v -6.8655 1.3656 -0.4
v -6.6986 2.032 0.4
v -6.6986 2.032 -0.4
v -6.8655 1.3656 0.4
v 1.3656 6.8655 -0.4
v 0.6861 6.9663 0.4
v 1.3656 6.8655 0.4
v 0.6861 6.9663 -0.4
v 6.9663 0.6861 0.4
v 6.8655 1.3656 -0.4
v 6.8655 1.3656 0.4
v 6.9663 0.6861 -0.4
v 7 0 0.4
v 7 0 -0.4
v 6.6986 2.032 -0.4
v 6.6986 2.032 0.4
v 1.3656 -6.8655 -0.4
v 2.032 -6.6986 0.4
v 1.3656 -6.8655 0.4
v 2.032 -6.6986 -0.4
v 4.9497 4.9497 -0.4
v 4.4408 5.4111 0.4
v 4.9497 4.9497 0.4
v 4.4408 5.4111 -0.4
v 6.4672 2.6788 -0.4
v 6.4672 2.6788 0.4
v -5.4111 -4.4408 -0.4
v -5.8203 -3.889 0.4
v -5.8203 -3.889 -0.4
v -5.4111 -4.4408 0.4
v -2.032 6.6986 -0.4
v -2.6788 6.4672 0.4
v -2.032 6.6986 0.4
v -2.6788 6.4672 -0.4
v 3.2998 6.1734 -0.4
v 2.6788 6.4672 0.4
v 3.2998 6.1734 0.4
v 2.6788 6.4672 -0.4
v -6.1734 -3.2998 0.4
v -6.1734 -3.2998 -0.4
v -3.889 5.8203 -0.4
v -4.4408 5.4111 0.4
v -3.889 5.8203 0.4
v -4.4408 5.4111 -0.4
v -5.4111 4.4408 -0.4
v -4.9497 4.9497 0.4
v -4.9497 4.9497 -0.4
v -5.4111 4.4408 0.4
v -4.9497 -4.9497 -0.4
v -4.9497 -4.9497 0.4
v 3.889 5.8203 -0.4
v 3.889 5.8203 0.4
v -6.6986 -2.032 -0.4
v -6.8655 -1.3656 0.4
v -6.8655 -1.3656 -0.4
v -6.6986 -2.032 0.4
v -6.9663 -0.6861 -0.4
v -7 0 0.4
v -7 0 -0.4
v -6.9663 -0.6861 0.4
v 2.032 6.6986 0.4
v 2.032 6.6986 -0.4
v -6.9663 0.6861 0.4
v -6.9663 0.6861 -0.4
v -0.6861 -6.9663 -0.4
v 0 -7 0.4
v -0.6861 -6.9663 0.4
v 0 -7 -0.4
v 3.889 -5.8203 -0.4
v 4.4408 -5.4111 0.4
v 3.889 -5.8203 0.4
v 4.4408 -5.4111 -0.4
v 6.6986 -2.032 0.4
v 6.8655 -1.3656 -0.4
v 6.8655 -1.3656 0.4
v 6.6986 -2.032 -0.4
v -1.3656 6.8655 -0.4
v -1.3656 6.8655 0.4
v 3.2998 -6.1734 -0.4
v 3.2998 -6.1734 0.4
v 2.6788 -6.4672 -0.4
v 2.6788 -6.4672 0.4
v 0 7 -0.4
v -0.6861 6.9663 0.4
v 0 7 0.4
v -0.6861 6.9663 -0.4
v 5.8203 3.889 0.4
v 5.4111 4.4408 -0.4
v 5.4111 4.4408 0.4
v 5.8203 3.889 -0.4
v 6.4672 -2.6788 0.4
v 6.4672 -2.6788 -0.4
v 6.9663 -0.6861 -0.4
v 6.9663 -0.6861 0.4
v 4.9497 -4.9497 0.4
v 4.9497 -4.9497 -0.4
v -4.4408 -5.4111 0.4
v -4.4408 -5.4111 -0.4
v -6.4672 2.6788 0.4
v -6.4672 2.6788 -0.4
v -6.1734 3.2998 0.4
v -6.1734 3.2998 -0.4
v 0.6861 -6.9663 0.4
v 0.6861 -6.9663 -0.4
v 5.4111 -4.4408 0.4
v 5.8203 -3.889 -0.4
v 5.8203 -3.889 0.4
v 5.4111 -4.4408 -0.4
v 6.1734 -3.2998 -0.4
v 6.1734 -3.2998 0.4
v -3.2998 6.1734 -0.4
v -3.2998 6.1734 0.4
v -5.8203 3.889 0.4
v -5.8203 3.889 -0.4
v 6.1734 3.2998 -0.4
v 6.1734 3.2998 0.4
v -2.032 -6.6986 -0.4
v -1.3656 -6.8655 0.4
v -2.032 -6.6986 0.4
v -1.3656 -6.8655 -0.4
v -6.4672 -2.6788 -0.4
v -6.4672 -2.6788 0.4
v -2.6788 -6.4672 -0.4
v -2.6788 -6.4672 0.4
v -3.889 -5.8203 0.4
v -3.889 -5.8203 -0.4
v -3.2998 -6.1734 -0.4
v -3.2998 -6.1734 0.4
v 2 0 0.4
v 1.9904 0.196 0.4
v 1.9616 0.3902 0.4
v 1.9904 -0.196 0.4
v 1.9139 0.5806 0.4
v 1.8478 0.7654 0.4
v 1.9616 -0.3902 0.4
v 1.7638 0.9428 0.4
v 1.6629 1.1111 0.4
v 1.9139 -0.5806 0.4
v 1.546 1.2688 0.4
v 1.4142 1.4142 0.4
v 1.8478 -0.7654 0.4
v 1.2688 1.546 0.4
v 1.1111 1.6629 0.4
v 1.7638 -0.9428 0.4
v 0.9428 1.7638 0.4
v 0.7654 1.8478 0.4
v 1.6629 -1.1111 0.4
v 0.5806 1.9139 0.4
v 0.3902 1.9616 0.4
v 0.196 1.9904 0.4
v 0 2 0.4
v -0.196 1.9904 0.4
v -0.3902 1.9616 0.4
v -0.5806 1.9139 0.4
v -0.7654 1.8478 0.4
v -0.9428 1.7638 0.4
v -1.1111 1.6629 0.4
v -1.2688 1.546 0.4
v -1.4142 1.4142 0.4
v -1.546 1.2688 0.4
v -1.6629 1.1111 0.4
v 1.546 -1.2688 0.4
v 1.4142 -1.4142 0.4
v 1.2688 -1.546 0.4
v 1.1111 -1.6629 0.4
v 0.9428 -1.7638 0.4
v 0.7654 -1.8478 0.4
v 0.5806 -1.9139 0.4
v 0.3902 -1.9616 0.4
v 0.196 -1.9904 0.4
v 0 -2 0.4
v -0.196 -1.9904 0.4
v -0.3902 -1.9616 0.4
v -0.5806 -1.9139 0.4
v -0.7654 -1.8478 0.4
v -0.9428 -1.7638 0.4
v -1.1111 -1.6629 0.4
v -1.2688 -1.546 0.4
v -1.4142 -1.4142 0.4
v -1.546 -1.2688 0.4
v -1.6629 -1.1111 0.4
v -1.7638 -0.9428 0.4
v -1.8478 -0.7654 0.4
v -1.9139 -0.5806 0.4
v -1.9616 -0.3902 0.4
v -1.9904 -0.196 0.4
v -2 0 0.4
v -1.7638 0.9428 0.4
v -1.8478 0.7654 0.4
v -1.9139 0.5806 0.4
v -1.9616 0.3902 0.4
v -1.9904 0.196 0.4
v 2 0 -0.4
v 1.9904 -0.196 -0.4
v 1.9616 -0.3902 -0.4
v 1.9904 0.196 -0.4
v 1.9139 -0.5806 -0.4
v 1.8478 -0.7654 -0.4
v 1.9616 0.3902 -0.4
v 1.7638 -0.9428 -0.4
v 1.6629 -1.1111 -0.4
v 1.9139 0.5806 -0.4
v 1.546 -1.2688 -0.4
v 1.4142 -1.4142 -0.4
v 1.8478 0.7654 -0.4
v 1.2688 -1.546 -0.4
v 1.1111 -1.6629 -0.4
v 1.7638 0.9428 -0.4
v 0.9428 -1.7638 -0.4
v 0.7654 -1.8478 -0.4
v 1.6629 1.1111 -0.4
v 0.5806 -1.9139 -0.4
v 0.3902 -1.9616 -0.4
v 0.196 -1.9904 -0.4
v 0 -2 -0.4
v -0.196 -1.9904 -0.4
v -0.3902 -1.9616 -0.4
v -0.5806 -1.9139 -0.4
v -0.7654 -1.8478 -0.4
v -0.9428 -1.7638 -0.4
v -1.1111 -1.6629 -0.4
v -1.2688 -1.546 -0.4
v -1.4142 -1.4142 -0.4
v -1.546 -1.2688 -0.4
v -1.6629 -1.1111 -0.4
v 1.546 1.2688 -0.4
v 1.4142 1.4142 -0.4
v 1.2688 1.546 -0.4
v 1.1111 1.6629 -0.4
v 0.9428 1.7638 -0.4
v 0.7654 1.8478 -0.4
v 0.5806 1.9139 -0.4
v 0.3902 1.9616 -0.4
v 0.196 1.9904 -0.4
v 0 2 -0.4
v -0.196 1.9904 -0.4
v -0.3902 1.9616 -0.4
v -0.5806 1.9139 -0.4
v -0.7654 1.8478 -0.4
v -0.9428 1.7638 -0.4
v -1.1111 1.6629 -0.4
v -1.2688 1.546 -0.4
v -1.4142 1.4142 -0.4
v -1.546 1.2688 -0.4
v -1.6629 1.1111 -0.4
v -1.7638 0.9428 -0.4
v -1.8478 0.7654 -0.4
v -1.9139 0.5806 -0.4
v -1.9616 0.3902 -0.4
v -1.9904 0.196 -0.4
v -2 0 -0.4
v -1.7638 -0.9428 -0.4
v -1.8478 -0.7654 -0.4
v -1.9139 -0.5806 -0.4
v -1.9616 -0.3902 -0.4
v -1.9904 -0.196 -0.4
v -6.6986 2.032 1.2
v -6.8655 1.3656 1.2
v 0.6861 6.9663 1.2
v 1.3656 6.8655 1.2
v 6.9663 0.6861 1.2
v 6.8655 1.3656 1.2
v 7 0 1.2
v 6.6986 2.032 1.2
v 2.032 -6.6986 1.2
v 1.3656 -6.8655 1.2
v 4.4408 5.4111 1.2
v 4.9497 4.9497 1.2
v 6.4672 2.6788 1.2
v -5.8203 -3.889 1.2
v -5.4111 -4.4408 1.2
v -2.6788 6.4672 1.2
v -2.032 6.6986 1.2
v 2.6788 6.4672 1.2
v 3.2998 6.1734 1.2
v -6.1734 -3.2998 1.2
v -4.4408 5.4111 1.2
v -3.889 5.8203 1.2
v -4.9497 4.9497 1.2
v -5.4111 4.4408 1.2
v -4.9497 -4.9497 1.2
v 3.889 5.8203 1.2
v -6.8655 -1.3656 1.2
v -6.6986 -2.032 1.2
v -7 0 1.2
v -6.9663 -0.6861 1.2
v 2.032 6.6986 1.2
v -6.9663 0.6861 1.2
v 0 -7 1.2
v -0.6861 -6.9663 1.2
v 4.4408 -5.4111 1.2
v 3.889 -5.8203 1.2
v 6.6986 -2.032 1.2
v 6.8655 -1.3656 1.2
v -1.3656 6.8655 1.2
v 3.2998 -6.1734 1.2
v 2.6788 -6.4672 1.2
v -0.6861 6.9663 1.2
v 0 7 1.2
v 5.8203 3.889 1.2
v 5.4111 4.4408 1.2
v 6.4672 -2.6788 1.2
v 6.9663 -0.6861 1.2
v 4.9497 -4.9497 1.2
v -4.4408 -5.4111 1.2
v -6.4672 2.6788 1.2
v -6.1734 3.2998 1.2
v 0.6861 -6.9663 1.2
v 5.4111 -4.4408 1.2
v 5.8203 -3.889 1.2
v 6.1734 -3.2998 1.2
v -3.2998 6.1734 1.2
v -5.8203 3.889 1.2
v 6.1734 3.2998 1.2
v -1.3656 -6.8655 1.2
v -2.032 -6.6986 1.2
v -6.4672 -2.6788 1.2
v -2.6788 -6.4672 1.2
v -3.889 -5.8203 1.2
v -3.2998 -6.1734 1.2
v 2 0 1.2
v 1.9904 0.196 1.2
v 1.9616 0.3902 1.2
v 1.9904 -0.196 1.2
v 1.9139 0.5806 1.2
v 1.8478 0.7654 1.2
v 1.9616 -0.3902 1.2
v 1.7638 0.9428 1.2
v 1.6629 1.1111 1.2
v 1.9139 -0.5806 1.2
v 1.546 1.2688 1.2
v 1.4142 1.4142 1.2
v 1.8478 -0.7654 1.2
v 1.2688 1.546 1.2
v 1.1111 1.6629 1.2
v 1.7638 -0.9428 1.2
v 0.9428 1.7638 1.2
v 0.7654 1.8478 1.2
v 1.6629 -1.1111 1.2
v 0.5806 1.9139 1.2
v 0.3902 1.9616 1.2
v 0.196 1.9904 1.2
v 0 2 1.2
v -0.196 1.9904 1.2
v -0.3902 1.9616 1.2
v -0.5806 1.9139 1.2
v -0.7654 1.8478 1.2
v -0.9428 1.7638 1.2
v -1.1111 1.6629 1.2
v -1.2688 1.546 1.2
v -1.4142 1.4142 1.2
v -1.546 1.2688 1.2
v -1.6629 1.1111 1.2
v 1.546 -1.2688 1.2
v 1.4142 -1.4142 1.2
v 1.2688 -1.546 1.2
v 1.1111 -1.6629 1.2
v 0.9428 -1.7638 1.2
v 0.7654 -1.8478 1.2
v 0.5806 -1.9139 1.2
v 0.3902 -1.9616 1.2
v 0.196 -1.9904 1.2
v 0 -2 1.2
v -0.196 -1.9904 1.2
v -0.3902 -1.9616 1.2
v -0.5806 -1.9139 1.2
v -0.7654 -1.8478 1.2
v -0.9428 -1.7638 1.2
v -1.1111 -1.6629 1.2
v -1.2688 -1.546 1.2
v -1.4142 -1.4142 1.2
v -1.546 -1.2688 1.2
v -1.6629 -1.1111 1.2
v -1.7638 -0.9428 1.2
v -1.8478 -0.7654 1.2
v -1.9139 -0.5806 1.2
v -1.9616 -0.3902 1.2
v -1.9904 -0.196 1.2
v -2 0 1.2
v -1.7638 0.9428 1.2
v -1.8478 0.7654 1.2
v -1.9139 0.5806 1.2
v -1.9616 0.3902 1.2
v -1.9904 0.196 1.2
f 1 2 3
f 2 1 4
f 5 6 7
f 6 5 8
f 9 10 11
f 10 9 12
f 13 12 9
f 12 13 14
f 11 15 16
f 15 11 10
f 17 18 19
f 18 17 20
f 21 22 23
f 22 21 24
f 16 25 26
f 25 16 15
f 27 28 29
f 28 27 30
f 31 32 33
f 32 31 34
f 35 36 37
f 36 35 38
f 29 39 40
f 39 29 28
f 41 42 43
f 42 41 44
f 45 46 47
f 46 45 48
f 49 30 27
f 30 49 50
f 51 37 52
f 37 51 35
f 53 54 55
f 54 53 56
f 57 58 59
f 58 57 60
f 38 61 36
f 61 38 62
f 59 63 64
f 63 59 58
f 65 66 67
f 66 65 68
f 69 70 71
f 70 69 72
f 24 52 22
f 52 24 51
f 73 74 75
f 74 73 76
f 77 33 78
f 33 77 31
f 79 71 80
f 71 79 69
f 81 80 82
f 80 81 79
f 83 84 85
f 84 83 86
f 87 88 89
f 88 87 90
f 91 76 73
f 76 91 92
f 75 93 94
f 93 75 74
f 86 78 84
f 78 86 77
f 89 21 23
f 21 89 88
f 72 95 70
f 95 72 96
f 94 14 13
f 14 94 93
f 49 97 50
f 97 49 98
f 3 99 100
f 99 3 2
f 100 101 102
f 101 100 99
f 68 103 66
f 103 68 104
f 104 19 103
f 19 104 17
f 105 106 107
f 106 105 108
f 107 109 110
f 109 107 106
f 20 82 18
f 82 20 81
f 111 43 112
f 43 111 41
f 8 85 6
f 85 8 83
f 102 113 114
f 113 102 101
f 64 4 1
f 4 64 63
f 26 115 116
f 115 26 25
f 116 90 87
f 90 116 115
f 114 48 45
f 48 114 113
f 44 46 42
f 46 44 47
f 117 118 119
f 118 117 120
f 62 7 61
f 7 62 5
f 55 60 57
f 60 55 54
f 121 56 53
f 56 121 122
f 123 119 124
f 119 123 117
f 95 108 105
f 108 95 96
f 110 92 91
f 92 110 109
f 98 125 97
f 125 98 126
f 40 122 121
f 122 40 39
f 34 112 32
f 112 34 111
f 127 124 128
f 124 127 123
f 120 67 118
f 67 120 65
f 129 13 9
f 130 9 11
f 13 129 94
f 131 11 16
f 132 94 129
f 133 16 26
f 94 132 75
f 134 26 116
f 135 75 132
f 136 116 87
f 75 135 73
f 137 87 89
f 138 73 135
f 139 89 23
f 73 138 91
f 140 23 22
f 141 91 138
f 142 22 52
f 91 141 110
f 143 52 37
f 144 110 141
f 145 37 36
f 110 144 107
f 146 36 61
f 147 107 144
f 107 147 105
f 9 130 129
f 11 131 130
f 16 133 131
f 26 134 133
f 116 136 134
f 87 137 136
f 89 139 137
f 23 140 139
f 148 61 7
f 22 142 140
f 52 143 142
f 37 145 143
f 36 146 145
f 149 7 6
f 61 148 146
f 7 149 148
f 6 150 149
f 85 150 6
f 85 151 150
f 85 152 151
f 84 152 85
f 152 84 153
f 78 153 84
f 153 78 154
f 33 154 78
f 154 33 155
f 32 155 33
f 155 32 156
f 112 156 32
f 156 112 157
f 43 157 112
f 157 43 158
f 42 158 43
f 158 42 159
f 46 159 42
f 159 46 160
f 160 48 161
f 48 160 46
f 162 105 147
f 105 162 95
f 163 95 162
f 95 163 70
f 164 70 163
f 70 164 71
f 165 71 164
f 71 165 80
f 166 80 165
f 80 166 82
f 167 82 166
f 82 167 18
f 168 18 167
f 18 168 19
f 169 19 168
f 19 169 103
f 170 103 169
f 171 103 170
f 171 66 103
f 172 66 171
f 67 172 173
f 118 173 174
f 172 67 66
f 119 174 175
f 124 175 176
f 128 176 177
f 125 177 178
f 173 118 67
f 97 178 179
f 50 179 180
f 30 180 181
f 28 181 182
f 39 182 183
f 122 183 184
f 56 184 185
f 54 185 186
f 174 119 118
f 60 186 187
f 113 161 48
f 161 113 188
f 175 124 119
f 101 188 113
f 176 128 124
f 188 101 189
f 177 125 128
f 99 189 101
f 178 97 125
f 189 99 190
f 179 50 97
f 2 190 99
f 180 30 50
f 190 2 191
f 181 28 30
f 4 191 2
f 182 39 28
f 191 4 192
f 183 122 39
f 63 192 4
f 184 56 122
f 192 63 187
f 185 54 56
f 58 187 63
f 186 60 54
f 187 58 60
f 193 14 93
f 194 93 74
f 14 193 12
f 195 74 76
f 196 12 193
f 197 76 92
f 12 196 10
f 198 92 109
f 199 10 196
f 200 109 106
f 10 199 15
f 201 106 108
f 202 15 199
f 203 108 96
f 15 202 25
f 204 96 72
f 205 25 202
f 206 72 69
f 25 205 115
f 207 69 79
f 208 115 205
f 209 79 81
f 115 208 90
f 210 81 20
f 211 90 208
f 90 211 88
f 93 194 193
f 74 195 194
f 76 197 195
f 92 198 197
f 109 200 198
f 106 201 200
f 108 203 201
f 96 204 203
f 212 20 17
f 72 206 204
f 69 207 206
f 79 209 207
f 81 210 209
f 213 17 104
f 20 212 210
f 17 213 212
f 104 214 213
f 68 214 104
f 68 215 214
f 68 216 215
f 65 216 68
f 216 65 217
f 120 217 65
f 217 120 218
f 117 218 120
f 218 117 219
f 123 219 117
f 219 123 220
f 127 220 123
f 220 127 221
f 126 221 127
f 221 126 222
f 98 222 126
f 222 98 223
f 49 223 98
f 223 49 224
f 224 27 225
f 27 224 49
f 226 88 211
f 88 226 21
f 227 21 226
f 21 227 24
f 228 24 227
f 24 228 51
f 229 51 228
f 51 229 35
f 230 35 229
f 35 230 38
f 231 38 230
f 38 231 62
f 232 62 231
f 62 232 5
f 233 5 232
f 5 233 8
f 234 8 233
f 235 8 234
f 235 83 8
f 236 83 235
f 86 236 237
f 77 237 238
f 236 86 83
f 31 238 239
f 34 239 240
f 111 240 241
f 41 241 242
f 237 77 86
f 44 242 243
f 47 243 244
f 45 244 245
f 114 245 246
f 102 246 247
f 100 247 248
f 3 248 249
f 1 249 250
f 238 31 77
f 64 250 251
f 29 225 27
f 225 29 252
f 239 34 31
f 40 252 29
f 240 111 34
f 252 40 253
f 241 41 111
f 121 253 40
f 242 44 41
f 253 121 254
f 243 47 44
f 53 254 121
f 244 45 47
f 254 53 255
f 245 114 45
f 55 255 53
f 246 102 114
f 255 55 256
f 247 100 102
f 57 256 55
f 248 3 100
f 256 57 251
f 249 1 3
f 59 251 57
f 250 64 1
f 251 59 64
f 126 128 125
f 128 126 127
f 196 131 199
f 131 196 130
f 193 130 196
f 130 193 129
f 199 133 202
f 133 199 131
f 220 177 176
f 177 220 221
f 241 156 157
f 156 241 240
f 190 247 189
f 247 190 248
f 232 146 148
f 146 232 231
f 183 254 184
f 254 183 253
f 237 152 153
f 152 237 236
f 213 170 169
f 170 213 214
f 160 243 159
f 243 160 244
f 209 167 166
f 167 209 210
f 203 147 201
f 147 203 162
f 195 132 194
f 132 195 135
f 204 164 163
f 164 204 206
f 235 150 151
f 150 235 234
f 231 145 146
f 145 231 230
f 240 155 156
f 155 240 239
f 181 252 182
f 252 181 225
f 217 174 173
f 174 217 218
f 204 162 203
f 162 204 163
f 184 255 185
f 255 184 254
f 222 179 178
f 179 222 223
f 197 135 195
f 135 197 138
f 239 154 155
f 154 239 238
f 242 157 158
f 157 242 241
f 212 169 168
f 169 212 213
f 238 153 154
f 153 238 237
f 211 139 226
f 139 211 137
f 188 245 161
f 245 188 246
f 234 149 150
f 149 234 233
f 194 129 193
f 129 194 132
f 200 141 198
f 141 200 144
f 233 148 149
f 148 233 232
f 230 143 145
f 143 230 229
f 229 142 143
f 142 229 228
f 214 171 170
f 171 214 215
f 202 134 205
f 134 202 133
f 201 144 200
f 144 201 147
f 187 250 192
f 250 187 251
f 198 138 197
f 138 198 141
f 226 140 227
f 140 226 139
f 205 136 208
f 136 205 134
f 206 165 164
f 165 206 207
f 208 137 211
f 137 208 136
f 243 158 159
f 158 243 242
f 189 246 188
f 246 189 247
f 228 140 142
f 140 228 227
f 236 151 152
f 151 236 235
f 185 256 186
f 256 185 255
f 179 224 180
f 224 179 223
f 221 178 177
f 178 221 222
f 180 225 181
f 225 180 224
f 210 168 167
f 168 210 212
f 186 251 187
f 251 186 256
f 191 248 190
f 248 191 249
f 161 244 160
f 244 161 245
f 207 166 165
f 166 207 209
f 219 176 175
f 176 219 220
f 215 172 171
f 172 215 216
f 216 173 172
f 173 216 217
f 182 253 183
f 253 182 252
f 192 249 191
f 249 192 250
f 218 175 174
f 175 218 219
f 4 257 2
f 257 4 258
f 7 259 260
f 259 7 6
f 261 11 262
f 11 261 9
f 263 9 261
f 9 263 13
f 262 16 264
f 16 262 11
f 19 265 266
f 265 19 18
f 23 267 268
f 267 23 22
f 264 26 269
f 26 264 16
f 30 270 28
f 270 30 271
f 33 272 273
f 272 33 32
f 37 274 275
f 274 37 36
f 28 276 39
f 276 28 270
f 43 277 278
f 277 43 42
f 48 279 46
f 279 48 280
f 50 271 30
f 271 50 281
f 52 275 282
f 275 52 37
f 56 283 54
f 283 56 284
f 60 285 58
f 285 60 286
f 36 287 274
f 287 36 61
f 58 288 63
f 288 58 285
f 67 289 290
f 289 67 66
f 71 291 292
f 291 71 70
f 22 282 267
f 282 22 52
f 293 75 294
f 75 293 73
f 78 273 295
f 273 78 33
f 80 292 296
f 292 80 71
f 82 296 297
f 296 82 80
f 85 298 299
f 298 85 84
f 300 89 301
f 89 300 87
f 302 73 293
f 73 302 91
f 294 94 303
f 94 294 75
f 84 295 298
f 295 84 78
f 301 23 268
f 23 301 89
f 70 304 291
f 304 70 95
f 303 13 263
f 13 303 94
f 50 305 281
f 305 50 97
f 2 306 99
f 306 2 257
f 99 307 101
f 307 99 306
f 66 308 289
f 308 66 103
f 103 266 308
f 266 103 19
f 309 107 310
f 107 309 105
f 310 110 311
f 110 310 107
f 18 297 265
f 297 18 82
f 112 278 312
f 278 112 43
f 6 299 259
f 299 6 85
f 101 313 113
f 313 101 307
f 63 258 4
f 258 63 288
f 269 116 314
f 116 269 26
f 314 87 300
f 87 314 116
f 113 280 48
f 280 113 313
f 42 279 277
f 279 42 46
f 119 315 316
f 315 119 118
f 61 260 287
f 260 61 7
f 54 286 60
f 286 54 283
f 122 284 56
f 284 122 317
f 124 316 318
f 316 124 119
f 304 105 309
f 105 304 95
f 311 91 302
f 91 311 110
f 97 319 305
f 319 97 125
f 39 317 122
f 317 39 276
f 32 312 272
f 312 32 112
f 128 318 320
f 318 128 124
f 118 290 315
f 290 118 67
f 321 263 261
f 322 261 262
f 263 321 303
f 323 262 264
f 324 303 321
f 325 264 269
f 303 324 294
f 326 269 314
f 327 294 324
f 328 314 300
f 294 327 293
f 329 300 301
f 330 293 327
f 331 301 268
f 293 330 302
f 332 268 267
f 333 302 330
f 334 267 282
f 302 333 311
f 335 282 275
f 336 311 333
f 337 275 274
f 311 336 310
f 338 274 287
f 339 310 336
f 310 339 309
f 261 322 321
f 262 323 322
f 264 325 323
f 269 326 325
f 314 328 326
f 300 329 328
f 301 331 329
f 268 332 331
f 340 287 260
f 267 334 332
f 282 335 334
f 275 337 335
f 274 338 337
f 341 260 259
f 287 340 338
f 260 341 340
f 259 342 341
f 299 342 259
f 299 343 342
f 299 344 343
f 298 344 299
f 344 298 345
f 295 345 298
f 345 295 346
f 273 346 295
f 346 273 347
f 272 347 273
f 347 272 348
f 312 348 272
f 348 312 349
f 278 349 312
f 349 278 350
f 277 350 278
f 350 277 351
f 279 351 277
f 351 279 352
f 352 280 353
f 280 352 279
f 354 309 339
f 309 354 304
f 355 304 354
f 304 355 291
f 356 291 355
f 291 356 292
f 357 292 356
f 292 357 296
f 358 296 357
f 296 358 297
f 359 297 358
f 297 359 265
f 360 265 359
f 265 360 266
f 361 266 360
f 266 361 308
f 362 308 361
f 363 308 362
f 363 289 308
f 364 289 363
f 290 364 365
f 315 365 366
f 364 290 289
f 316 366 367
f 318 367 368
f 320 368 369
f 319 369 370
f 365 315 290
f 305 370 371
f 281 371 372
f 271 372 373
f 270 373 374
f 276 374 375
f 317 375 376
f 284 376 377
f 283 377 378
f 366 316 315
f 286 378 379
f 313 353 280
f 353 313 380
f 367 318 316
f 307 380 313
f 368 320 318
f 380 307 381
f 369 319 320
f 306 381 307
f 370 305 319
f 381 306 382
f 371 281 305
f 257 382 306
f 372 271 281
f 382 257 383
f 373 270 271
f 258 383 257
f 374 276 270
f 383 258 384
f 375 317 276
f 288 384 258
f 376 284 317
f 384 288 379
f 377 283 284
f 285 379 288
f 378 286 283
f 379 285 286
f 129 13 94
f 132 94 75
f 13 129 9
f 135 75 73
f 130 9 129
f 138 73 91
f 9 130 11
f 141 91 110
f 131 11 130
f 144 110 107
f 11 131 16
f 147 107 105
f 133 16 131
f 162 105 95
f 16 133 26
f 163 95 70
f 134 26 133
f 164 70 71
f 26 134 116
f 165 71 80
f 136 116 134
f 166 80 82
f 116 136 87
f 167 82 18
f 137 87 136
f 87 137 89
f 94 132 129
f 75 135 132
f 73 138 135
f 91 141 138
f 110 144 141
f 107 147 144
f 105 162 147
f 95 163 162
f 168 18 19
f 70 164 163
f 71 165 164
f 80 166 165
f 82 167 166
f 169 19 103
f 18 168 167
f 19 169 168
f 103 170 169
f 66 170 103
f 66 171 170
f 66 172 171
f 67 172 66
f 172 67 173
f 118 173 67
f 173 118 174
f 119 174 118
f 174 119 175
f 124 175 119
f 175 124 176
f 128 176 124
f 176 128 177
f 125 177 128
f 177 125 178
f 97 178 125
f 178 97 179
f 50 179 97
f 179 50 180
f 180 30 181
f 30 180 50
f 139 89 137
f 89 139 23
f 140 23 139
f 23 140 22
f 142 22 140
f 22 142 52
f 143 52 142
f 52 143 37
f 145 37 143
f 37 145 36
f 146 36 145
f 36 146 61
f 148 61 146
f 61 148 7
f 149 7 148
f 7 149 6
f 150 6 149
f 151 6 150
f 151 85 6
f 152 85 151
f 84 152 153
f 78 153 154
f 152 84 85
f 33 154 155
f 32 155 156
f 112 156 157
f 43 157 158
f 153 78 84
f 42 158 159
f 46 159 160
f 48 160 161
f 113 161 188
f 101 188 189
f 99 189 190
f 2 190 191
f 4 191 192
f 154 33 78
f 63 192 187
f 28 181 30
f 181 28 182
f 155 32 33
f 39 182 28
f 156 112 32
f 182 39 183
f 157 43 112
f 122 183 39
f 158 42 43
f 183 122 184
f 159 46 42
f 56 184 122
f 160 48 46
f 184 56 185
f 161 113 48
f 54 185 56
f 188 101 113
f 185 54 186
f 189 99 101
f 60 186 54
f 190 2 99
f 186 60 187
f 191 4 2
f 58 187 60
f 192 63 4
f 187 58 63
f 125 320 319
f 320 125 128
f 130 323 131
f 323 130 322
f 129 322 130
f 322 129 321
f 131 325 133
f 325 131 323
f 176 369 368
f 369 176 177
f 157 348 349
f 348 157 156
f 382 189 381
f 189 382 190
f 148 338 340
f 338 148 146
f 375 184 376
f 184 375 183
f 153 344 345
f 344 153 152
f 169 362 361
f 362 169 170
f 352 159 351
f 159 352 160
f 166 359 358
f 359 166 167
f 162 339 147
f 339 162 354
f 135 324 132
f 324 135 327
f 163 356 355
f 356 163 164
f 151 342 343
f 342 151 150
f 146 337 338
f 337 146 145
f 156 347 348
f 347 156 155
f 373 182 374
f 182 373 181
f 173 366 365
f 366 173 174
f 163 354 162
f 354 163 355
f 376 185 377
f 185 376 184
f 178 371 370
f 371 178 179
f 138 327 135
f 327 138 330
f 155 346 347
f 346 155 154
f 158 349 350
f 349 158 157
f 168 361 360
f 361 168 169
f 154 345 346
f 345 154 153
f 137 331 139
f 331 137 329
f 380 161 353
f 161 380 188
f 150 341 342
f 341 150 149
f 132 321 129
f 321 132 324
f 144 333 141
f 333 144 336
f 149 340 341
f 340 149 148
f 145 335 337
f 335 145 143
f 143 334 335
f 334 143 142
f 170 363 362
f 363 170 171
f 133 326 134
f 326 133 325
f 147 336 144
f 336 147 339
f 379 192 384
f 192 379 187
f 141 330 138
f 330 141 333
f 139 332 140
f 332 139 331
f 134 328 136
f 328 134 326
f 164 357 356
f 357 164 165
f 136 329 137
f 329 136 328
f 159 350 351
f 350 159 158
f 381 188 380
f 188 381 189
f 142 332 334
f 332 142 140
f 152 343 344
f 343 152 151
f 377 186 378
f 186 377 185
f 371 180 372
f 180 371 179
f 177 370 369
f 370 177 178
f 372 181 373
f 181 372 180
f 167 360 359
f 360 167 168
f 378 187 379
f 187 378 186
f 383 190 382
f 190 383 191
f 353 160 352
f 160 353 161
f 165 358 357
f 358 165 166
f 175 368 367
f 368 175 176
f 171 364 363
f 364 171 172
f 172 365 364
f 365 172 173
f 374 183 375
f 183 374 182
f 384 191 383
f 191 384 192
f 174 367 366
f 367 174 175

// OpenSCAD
// Parameters
inner_diameter_mm = 4.0; //[2.0:8.0:0.1]
outer_diameter_mm = 14.0; //[7.0:28.0:0.1]
thickness_mm = 0.8; //[0.4:1.6:0.05]
eps_mm = 0.6; //[0.2:2.0:0.1]

// Penny Washer - complete geometry
module penny_washer() {
  color("Silver") {
    difference() {
      // Outer ring
      cylinder(r=outer_diameter_mm/2, h=thickness_mm, center=true, $fn=64);
      // Inner hole
      cylinder(r=inner_diameter_mm/2, h=thickness_mm + 2*eps_mm, center=true, $fn=64);
    }
  }
}

// Round Grommet Top - complete geometry
module round_grommet_top() {
  color("DimGray") {
    difference() {
      // Outer ring
      cylinder(r=outer_diameter_mm/2, h=thickness_mm, center=true, $fn=64);
      // Inner hole
      cylinder(r=inner_diameter_mm/2, h=thickness_mm + 2*eps_mm, center=true, $fn=64);
    }
  }
}

// Round Grommet Assembly - complete geometry
module round_grommet_assembly() {
  color("DimGray") {
    difference() {
      // Outer ring
      cylinder(r=outer_diameter_mm/2, h=thickness_mm, center=true, $fn=64);
      // Inner hole
      cylinder(r=inner_diameter_mm/2, h=thickness_mm + 2*eps_mm, center=true, $fn=64);
    }
  }
}

// Screw and Washer - complete geometry
module screw_and_washer() {
  union() {
    penny_washer();
    round_grommet_assembly();
  }
}

// Assembly
module assembly() {
  screw_and_washer();
  translate([0, 0, thickness_mm]) round_grommet_top();
}

assembly();
